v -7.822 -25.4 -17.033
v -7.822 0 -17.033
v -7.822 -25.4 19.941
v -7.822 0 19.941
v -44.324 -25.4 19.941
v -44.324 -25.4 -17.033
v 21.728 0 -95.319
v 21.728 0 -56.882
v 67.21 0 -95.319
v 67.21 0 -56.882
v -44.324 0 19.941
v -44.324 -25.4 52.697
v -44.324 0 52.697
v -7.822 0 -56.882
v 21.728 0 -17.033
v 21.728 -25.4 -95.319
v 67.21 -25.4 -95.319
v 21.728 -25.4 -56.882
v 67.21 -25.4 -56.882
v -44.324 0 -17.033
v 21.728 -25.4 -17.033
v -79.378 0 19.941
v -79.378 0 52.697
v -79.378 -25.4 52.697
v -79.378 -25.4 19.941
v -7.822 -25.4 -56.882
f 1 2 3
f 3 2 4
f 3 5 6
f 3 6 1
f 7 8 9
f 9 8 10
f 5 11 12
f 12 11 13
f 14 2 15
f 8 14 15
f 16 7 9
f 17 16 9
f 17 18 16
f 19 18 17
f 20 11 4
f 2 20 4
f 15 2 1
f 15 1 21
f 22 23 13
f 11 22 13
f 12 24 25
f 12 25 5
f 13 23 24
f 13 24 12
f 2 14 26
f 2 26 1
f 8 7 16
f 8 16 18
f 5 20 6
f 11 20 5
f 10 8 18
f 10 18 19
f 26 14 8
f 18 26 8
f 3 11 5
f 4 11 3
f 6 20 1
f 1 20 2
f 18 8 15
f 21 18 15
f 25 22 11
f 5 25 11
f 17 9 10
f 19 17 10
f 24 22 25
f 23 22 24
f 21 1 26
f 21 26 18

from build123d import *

# Parameters (mm, degrees)
F0_W     = 45.4829260707
F0_H     = 38.4368486702
F1_DEPTH = 25.4
F0_W_2   = 29.5494180173
F0_H_2   = 39.8497525603
F0_W_3   = 36.5022253245
F0_H_3   = 36.9735397398
F0_W_4   = 35.0537188351
F0_H_4   = 32.7565018088


# Not quite as in the source:
# - a feature of the source that left no trace in its solid (it failed there, or was rolled back) is left out


with BuildPart() as f1:
    # F0 (on Front) → F1 (new body)
    with BuildSketch(Plane.XZ):
        with Locations((44.4689802825, -76.1008691043)):
            Rectangle(F0_W, F0_H)
    extrude(amount=F1_DEPTH)


with BuildPart() as f1b:
    # F0 (on Front) → F1, piece 2 (new body)
    with BuildSketch(Plane.XZ):
        with Locations((6.9528082386, -36.957568489)):
            Rectangle(F0_W_2, F0_H_2)
    extrude(amount=F1_DEPTH)


with BuildPart() as f1c:
    # F0 (on Front) → F1, piece 3 (new body)
    with BuildSketch(Plane.XZ):
        with Locations((-26.0730134323, 1.454077661)):
            Rectangle(F0_W_3, F0_H_3)
    extrude(amount=F1_DEPTH)


with BuildPart() as f1d:
    # F0 (on Front) → F1, piece 4 (new body)
    with BuildSketch(Plane.XZ):
        with Locations((-61.8509855121, 36.3190984353)):
            Rectangle(F0_W_4, F0_H_4)
    extrude(amount=F1_DEPTH)


solid = Compound([f1.part, f1b.part, f1c.part, f1d.part])
